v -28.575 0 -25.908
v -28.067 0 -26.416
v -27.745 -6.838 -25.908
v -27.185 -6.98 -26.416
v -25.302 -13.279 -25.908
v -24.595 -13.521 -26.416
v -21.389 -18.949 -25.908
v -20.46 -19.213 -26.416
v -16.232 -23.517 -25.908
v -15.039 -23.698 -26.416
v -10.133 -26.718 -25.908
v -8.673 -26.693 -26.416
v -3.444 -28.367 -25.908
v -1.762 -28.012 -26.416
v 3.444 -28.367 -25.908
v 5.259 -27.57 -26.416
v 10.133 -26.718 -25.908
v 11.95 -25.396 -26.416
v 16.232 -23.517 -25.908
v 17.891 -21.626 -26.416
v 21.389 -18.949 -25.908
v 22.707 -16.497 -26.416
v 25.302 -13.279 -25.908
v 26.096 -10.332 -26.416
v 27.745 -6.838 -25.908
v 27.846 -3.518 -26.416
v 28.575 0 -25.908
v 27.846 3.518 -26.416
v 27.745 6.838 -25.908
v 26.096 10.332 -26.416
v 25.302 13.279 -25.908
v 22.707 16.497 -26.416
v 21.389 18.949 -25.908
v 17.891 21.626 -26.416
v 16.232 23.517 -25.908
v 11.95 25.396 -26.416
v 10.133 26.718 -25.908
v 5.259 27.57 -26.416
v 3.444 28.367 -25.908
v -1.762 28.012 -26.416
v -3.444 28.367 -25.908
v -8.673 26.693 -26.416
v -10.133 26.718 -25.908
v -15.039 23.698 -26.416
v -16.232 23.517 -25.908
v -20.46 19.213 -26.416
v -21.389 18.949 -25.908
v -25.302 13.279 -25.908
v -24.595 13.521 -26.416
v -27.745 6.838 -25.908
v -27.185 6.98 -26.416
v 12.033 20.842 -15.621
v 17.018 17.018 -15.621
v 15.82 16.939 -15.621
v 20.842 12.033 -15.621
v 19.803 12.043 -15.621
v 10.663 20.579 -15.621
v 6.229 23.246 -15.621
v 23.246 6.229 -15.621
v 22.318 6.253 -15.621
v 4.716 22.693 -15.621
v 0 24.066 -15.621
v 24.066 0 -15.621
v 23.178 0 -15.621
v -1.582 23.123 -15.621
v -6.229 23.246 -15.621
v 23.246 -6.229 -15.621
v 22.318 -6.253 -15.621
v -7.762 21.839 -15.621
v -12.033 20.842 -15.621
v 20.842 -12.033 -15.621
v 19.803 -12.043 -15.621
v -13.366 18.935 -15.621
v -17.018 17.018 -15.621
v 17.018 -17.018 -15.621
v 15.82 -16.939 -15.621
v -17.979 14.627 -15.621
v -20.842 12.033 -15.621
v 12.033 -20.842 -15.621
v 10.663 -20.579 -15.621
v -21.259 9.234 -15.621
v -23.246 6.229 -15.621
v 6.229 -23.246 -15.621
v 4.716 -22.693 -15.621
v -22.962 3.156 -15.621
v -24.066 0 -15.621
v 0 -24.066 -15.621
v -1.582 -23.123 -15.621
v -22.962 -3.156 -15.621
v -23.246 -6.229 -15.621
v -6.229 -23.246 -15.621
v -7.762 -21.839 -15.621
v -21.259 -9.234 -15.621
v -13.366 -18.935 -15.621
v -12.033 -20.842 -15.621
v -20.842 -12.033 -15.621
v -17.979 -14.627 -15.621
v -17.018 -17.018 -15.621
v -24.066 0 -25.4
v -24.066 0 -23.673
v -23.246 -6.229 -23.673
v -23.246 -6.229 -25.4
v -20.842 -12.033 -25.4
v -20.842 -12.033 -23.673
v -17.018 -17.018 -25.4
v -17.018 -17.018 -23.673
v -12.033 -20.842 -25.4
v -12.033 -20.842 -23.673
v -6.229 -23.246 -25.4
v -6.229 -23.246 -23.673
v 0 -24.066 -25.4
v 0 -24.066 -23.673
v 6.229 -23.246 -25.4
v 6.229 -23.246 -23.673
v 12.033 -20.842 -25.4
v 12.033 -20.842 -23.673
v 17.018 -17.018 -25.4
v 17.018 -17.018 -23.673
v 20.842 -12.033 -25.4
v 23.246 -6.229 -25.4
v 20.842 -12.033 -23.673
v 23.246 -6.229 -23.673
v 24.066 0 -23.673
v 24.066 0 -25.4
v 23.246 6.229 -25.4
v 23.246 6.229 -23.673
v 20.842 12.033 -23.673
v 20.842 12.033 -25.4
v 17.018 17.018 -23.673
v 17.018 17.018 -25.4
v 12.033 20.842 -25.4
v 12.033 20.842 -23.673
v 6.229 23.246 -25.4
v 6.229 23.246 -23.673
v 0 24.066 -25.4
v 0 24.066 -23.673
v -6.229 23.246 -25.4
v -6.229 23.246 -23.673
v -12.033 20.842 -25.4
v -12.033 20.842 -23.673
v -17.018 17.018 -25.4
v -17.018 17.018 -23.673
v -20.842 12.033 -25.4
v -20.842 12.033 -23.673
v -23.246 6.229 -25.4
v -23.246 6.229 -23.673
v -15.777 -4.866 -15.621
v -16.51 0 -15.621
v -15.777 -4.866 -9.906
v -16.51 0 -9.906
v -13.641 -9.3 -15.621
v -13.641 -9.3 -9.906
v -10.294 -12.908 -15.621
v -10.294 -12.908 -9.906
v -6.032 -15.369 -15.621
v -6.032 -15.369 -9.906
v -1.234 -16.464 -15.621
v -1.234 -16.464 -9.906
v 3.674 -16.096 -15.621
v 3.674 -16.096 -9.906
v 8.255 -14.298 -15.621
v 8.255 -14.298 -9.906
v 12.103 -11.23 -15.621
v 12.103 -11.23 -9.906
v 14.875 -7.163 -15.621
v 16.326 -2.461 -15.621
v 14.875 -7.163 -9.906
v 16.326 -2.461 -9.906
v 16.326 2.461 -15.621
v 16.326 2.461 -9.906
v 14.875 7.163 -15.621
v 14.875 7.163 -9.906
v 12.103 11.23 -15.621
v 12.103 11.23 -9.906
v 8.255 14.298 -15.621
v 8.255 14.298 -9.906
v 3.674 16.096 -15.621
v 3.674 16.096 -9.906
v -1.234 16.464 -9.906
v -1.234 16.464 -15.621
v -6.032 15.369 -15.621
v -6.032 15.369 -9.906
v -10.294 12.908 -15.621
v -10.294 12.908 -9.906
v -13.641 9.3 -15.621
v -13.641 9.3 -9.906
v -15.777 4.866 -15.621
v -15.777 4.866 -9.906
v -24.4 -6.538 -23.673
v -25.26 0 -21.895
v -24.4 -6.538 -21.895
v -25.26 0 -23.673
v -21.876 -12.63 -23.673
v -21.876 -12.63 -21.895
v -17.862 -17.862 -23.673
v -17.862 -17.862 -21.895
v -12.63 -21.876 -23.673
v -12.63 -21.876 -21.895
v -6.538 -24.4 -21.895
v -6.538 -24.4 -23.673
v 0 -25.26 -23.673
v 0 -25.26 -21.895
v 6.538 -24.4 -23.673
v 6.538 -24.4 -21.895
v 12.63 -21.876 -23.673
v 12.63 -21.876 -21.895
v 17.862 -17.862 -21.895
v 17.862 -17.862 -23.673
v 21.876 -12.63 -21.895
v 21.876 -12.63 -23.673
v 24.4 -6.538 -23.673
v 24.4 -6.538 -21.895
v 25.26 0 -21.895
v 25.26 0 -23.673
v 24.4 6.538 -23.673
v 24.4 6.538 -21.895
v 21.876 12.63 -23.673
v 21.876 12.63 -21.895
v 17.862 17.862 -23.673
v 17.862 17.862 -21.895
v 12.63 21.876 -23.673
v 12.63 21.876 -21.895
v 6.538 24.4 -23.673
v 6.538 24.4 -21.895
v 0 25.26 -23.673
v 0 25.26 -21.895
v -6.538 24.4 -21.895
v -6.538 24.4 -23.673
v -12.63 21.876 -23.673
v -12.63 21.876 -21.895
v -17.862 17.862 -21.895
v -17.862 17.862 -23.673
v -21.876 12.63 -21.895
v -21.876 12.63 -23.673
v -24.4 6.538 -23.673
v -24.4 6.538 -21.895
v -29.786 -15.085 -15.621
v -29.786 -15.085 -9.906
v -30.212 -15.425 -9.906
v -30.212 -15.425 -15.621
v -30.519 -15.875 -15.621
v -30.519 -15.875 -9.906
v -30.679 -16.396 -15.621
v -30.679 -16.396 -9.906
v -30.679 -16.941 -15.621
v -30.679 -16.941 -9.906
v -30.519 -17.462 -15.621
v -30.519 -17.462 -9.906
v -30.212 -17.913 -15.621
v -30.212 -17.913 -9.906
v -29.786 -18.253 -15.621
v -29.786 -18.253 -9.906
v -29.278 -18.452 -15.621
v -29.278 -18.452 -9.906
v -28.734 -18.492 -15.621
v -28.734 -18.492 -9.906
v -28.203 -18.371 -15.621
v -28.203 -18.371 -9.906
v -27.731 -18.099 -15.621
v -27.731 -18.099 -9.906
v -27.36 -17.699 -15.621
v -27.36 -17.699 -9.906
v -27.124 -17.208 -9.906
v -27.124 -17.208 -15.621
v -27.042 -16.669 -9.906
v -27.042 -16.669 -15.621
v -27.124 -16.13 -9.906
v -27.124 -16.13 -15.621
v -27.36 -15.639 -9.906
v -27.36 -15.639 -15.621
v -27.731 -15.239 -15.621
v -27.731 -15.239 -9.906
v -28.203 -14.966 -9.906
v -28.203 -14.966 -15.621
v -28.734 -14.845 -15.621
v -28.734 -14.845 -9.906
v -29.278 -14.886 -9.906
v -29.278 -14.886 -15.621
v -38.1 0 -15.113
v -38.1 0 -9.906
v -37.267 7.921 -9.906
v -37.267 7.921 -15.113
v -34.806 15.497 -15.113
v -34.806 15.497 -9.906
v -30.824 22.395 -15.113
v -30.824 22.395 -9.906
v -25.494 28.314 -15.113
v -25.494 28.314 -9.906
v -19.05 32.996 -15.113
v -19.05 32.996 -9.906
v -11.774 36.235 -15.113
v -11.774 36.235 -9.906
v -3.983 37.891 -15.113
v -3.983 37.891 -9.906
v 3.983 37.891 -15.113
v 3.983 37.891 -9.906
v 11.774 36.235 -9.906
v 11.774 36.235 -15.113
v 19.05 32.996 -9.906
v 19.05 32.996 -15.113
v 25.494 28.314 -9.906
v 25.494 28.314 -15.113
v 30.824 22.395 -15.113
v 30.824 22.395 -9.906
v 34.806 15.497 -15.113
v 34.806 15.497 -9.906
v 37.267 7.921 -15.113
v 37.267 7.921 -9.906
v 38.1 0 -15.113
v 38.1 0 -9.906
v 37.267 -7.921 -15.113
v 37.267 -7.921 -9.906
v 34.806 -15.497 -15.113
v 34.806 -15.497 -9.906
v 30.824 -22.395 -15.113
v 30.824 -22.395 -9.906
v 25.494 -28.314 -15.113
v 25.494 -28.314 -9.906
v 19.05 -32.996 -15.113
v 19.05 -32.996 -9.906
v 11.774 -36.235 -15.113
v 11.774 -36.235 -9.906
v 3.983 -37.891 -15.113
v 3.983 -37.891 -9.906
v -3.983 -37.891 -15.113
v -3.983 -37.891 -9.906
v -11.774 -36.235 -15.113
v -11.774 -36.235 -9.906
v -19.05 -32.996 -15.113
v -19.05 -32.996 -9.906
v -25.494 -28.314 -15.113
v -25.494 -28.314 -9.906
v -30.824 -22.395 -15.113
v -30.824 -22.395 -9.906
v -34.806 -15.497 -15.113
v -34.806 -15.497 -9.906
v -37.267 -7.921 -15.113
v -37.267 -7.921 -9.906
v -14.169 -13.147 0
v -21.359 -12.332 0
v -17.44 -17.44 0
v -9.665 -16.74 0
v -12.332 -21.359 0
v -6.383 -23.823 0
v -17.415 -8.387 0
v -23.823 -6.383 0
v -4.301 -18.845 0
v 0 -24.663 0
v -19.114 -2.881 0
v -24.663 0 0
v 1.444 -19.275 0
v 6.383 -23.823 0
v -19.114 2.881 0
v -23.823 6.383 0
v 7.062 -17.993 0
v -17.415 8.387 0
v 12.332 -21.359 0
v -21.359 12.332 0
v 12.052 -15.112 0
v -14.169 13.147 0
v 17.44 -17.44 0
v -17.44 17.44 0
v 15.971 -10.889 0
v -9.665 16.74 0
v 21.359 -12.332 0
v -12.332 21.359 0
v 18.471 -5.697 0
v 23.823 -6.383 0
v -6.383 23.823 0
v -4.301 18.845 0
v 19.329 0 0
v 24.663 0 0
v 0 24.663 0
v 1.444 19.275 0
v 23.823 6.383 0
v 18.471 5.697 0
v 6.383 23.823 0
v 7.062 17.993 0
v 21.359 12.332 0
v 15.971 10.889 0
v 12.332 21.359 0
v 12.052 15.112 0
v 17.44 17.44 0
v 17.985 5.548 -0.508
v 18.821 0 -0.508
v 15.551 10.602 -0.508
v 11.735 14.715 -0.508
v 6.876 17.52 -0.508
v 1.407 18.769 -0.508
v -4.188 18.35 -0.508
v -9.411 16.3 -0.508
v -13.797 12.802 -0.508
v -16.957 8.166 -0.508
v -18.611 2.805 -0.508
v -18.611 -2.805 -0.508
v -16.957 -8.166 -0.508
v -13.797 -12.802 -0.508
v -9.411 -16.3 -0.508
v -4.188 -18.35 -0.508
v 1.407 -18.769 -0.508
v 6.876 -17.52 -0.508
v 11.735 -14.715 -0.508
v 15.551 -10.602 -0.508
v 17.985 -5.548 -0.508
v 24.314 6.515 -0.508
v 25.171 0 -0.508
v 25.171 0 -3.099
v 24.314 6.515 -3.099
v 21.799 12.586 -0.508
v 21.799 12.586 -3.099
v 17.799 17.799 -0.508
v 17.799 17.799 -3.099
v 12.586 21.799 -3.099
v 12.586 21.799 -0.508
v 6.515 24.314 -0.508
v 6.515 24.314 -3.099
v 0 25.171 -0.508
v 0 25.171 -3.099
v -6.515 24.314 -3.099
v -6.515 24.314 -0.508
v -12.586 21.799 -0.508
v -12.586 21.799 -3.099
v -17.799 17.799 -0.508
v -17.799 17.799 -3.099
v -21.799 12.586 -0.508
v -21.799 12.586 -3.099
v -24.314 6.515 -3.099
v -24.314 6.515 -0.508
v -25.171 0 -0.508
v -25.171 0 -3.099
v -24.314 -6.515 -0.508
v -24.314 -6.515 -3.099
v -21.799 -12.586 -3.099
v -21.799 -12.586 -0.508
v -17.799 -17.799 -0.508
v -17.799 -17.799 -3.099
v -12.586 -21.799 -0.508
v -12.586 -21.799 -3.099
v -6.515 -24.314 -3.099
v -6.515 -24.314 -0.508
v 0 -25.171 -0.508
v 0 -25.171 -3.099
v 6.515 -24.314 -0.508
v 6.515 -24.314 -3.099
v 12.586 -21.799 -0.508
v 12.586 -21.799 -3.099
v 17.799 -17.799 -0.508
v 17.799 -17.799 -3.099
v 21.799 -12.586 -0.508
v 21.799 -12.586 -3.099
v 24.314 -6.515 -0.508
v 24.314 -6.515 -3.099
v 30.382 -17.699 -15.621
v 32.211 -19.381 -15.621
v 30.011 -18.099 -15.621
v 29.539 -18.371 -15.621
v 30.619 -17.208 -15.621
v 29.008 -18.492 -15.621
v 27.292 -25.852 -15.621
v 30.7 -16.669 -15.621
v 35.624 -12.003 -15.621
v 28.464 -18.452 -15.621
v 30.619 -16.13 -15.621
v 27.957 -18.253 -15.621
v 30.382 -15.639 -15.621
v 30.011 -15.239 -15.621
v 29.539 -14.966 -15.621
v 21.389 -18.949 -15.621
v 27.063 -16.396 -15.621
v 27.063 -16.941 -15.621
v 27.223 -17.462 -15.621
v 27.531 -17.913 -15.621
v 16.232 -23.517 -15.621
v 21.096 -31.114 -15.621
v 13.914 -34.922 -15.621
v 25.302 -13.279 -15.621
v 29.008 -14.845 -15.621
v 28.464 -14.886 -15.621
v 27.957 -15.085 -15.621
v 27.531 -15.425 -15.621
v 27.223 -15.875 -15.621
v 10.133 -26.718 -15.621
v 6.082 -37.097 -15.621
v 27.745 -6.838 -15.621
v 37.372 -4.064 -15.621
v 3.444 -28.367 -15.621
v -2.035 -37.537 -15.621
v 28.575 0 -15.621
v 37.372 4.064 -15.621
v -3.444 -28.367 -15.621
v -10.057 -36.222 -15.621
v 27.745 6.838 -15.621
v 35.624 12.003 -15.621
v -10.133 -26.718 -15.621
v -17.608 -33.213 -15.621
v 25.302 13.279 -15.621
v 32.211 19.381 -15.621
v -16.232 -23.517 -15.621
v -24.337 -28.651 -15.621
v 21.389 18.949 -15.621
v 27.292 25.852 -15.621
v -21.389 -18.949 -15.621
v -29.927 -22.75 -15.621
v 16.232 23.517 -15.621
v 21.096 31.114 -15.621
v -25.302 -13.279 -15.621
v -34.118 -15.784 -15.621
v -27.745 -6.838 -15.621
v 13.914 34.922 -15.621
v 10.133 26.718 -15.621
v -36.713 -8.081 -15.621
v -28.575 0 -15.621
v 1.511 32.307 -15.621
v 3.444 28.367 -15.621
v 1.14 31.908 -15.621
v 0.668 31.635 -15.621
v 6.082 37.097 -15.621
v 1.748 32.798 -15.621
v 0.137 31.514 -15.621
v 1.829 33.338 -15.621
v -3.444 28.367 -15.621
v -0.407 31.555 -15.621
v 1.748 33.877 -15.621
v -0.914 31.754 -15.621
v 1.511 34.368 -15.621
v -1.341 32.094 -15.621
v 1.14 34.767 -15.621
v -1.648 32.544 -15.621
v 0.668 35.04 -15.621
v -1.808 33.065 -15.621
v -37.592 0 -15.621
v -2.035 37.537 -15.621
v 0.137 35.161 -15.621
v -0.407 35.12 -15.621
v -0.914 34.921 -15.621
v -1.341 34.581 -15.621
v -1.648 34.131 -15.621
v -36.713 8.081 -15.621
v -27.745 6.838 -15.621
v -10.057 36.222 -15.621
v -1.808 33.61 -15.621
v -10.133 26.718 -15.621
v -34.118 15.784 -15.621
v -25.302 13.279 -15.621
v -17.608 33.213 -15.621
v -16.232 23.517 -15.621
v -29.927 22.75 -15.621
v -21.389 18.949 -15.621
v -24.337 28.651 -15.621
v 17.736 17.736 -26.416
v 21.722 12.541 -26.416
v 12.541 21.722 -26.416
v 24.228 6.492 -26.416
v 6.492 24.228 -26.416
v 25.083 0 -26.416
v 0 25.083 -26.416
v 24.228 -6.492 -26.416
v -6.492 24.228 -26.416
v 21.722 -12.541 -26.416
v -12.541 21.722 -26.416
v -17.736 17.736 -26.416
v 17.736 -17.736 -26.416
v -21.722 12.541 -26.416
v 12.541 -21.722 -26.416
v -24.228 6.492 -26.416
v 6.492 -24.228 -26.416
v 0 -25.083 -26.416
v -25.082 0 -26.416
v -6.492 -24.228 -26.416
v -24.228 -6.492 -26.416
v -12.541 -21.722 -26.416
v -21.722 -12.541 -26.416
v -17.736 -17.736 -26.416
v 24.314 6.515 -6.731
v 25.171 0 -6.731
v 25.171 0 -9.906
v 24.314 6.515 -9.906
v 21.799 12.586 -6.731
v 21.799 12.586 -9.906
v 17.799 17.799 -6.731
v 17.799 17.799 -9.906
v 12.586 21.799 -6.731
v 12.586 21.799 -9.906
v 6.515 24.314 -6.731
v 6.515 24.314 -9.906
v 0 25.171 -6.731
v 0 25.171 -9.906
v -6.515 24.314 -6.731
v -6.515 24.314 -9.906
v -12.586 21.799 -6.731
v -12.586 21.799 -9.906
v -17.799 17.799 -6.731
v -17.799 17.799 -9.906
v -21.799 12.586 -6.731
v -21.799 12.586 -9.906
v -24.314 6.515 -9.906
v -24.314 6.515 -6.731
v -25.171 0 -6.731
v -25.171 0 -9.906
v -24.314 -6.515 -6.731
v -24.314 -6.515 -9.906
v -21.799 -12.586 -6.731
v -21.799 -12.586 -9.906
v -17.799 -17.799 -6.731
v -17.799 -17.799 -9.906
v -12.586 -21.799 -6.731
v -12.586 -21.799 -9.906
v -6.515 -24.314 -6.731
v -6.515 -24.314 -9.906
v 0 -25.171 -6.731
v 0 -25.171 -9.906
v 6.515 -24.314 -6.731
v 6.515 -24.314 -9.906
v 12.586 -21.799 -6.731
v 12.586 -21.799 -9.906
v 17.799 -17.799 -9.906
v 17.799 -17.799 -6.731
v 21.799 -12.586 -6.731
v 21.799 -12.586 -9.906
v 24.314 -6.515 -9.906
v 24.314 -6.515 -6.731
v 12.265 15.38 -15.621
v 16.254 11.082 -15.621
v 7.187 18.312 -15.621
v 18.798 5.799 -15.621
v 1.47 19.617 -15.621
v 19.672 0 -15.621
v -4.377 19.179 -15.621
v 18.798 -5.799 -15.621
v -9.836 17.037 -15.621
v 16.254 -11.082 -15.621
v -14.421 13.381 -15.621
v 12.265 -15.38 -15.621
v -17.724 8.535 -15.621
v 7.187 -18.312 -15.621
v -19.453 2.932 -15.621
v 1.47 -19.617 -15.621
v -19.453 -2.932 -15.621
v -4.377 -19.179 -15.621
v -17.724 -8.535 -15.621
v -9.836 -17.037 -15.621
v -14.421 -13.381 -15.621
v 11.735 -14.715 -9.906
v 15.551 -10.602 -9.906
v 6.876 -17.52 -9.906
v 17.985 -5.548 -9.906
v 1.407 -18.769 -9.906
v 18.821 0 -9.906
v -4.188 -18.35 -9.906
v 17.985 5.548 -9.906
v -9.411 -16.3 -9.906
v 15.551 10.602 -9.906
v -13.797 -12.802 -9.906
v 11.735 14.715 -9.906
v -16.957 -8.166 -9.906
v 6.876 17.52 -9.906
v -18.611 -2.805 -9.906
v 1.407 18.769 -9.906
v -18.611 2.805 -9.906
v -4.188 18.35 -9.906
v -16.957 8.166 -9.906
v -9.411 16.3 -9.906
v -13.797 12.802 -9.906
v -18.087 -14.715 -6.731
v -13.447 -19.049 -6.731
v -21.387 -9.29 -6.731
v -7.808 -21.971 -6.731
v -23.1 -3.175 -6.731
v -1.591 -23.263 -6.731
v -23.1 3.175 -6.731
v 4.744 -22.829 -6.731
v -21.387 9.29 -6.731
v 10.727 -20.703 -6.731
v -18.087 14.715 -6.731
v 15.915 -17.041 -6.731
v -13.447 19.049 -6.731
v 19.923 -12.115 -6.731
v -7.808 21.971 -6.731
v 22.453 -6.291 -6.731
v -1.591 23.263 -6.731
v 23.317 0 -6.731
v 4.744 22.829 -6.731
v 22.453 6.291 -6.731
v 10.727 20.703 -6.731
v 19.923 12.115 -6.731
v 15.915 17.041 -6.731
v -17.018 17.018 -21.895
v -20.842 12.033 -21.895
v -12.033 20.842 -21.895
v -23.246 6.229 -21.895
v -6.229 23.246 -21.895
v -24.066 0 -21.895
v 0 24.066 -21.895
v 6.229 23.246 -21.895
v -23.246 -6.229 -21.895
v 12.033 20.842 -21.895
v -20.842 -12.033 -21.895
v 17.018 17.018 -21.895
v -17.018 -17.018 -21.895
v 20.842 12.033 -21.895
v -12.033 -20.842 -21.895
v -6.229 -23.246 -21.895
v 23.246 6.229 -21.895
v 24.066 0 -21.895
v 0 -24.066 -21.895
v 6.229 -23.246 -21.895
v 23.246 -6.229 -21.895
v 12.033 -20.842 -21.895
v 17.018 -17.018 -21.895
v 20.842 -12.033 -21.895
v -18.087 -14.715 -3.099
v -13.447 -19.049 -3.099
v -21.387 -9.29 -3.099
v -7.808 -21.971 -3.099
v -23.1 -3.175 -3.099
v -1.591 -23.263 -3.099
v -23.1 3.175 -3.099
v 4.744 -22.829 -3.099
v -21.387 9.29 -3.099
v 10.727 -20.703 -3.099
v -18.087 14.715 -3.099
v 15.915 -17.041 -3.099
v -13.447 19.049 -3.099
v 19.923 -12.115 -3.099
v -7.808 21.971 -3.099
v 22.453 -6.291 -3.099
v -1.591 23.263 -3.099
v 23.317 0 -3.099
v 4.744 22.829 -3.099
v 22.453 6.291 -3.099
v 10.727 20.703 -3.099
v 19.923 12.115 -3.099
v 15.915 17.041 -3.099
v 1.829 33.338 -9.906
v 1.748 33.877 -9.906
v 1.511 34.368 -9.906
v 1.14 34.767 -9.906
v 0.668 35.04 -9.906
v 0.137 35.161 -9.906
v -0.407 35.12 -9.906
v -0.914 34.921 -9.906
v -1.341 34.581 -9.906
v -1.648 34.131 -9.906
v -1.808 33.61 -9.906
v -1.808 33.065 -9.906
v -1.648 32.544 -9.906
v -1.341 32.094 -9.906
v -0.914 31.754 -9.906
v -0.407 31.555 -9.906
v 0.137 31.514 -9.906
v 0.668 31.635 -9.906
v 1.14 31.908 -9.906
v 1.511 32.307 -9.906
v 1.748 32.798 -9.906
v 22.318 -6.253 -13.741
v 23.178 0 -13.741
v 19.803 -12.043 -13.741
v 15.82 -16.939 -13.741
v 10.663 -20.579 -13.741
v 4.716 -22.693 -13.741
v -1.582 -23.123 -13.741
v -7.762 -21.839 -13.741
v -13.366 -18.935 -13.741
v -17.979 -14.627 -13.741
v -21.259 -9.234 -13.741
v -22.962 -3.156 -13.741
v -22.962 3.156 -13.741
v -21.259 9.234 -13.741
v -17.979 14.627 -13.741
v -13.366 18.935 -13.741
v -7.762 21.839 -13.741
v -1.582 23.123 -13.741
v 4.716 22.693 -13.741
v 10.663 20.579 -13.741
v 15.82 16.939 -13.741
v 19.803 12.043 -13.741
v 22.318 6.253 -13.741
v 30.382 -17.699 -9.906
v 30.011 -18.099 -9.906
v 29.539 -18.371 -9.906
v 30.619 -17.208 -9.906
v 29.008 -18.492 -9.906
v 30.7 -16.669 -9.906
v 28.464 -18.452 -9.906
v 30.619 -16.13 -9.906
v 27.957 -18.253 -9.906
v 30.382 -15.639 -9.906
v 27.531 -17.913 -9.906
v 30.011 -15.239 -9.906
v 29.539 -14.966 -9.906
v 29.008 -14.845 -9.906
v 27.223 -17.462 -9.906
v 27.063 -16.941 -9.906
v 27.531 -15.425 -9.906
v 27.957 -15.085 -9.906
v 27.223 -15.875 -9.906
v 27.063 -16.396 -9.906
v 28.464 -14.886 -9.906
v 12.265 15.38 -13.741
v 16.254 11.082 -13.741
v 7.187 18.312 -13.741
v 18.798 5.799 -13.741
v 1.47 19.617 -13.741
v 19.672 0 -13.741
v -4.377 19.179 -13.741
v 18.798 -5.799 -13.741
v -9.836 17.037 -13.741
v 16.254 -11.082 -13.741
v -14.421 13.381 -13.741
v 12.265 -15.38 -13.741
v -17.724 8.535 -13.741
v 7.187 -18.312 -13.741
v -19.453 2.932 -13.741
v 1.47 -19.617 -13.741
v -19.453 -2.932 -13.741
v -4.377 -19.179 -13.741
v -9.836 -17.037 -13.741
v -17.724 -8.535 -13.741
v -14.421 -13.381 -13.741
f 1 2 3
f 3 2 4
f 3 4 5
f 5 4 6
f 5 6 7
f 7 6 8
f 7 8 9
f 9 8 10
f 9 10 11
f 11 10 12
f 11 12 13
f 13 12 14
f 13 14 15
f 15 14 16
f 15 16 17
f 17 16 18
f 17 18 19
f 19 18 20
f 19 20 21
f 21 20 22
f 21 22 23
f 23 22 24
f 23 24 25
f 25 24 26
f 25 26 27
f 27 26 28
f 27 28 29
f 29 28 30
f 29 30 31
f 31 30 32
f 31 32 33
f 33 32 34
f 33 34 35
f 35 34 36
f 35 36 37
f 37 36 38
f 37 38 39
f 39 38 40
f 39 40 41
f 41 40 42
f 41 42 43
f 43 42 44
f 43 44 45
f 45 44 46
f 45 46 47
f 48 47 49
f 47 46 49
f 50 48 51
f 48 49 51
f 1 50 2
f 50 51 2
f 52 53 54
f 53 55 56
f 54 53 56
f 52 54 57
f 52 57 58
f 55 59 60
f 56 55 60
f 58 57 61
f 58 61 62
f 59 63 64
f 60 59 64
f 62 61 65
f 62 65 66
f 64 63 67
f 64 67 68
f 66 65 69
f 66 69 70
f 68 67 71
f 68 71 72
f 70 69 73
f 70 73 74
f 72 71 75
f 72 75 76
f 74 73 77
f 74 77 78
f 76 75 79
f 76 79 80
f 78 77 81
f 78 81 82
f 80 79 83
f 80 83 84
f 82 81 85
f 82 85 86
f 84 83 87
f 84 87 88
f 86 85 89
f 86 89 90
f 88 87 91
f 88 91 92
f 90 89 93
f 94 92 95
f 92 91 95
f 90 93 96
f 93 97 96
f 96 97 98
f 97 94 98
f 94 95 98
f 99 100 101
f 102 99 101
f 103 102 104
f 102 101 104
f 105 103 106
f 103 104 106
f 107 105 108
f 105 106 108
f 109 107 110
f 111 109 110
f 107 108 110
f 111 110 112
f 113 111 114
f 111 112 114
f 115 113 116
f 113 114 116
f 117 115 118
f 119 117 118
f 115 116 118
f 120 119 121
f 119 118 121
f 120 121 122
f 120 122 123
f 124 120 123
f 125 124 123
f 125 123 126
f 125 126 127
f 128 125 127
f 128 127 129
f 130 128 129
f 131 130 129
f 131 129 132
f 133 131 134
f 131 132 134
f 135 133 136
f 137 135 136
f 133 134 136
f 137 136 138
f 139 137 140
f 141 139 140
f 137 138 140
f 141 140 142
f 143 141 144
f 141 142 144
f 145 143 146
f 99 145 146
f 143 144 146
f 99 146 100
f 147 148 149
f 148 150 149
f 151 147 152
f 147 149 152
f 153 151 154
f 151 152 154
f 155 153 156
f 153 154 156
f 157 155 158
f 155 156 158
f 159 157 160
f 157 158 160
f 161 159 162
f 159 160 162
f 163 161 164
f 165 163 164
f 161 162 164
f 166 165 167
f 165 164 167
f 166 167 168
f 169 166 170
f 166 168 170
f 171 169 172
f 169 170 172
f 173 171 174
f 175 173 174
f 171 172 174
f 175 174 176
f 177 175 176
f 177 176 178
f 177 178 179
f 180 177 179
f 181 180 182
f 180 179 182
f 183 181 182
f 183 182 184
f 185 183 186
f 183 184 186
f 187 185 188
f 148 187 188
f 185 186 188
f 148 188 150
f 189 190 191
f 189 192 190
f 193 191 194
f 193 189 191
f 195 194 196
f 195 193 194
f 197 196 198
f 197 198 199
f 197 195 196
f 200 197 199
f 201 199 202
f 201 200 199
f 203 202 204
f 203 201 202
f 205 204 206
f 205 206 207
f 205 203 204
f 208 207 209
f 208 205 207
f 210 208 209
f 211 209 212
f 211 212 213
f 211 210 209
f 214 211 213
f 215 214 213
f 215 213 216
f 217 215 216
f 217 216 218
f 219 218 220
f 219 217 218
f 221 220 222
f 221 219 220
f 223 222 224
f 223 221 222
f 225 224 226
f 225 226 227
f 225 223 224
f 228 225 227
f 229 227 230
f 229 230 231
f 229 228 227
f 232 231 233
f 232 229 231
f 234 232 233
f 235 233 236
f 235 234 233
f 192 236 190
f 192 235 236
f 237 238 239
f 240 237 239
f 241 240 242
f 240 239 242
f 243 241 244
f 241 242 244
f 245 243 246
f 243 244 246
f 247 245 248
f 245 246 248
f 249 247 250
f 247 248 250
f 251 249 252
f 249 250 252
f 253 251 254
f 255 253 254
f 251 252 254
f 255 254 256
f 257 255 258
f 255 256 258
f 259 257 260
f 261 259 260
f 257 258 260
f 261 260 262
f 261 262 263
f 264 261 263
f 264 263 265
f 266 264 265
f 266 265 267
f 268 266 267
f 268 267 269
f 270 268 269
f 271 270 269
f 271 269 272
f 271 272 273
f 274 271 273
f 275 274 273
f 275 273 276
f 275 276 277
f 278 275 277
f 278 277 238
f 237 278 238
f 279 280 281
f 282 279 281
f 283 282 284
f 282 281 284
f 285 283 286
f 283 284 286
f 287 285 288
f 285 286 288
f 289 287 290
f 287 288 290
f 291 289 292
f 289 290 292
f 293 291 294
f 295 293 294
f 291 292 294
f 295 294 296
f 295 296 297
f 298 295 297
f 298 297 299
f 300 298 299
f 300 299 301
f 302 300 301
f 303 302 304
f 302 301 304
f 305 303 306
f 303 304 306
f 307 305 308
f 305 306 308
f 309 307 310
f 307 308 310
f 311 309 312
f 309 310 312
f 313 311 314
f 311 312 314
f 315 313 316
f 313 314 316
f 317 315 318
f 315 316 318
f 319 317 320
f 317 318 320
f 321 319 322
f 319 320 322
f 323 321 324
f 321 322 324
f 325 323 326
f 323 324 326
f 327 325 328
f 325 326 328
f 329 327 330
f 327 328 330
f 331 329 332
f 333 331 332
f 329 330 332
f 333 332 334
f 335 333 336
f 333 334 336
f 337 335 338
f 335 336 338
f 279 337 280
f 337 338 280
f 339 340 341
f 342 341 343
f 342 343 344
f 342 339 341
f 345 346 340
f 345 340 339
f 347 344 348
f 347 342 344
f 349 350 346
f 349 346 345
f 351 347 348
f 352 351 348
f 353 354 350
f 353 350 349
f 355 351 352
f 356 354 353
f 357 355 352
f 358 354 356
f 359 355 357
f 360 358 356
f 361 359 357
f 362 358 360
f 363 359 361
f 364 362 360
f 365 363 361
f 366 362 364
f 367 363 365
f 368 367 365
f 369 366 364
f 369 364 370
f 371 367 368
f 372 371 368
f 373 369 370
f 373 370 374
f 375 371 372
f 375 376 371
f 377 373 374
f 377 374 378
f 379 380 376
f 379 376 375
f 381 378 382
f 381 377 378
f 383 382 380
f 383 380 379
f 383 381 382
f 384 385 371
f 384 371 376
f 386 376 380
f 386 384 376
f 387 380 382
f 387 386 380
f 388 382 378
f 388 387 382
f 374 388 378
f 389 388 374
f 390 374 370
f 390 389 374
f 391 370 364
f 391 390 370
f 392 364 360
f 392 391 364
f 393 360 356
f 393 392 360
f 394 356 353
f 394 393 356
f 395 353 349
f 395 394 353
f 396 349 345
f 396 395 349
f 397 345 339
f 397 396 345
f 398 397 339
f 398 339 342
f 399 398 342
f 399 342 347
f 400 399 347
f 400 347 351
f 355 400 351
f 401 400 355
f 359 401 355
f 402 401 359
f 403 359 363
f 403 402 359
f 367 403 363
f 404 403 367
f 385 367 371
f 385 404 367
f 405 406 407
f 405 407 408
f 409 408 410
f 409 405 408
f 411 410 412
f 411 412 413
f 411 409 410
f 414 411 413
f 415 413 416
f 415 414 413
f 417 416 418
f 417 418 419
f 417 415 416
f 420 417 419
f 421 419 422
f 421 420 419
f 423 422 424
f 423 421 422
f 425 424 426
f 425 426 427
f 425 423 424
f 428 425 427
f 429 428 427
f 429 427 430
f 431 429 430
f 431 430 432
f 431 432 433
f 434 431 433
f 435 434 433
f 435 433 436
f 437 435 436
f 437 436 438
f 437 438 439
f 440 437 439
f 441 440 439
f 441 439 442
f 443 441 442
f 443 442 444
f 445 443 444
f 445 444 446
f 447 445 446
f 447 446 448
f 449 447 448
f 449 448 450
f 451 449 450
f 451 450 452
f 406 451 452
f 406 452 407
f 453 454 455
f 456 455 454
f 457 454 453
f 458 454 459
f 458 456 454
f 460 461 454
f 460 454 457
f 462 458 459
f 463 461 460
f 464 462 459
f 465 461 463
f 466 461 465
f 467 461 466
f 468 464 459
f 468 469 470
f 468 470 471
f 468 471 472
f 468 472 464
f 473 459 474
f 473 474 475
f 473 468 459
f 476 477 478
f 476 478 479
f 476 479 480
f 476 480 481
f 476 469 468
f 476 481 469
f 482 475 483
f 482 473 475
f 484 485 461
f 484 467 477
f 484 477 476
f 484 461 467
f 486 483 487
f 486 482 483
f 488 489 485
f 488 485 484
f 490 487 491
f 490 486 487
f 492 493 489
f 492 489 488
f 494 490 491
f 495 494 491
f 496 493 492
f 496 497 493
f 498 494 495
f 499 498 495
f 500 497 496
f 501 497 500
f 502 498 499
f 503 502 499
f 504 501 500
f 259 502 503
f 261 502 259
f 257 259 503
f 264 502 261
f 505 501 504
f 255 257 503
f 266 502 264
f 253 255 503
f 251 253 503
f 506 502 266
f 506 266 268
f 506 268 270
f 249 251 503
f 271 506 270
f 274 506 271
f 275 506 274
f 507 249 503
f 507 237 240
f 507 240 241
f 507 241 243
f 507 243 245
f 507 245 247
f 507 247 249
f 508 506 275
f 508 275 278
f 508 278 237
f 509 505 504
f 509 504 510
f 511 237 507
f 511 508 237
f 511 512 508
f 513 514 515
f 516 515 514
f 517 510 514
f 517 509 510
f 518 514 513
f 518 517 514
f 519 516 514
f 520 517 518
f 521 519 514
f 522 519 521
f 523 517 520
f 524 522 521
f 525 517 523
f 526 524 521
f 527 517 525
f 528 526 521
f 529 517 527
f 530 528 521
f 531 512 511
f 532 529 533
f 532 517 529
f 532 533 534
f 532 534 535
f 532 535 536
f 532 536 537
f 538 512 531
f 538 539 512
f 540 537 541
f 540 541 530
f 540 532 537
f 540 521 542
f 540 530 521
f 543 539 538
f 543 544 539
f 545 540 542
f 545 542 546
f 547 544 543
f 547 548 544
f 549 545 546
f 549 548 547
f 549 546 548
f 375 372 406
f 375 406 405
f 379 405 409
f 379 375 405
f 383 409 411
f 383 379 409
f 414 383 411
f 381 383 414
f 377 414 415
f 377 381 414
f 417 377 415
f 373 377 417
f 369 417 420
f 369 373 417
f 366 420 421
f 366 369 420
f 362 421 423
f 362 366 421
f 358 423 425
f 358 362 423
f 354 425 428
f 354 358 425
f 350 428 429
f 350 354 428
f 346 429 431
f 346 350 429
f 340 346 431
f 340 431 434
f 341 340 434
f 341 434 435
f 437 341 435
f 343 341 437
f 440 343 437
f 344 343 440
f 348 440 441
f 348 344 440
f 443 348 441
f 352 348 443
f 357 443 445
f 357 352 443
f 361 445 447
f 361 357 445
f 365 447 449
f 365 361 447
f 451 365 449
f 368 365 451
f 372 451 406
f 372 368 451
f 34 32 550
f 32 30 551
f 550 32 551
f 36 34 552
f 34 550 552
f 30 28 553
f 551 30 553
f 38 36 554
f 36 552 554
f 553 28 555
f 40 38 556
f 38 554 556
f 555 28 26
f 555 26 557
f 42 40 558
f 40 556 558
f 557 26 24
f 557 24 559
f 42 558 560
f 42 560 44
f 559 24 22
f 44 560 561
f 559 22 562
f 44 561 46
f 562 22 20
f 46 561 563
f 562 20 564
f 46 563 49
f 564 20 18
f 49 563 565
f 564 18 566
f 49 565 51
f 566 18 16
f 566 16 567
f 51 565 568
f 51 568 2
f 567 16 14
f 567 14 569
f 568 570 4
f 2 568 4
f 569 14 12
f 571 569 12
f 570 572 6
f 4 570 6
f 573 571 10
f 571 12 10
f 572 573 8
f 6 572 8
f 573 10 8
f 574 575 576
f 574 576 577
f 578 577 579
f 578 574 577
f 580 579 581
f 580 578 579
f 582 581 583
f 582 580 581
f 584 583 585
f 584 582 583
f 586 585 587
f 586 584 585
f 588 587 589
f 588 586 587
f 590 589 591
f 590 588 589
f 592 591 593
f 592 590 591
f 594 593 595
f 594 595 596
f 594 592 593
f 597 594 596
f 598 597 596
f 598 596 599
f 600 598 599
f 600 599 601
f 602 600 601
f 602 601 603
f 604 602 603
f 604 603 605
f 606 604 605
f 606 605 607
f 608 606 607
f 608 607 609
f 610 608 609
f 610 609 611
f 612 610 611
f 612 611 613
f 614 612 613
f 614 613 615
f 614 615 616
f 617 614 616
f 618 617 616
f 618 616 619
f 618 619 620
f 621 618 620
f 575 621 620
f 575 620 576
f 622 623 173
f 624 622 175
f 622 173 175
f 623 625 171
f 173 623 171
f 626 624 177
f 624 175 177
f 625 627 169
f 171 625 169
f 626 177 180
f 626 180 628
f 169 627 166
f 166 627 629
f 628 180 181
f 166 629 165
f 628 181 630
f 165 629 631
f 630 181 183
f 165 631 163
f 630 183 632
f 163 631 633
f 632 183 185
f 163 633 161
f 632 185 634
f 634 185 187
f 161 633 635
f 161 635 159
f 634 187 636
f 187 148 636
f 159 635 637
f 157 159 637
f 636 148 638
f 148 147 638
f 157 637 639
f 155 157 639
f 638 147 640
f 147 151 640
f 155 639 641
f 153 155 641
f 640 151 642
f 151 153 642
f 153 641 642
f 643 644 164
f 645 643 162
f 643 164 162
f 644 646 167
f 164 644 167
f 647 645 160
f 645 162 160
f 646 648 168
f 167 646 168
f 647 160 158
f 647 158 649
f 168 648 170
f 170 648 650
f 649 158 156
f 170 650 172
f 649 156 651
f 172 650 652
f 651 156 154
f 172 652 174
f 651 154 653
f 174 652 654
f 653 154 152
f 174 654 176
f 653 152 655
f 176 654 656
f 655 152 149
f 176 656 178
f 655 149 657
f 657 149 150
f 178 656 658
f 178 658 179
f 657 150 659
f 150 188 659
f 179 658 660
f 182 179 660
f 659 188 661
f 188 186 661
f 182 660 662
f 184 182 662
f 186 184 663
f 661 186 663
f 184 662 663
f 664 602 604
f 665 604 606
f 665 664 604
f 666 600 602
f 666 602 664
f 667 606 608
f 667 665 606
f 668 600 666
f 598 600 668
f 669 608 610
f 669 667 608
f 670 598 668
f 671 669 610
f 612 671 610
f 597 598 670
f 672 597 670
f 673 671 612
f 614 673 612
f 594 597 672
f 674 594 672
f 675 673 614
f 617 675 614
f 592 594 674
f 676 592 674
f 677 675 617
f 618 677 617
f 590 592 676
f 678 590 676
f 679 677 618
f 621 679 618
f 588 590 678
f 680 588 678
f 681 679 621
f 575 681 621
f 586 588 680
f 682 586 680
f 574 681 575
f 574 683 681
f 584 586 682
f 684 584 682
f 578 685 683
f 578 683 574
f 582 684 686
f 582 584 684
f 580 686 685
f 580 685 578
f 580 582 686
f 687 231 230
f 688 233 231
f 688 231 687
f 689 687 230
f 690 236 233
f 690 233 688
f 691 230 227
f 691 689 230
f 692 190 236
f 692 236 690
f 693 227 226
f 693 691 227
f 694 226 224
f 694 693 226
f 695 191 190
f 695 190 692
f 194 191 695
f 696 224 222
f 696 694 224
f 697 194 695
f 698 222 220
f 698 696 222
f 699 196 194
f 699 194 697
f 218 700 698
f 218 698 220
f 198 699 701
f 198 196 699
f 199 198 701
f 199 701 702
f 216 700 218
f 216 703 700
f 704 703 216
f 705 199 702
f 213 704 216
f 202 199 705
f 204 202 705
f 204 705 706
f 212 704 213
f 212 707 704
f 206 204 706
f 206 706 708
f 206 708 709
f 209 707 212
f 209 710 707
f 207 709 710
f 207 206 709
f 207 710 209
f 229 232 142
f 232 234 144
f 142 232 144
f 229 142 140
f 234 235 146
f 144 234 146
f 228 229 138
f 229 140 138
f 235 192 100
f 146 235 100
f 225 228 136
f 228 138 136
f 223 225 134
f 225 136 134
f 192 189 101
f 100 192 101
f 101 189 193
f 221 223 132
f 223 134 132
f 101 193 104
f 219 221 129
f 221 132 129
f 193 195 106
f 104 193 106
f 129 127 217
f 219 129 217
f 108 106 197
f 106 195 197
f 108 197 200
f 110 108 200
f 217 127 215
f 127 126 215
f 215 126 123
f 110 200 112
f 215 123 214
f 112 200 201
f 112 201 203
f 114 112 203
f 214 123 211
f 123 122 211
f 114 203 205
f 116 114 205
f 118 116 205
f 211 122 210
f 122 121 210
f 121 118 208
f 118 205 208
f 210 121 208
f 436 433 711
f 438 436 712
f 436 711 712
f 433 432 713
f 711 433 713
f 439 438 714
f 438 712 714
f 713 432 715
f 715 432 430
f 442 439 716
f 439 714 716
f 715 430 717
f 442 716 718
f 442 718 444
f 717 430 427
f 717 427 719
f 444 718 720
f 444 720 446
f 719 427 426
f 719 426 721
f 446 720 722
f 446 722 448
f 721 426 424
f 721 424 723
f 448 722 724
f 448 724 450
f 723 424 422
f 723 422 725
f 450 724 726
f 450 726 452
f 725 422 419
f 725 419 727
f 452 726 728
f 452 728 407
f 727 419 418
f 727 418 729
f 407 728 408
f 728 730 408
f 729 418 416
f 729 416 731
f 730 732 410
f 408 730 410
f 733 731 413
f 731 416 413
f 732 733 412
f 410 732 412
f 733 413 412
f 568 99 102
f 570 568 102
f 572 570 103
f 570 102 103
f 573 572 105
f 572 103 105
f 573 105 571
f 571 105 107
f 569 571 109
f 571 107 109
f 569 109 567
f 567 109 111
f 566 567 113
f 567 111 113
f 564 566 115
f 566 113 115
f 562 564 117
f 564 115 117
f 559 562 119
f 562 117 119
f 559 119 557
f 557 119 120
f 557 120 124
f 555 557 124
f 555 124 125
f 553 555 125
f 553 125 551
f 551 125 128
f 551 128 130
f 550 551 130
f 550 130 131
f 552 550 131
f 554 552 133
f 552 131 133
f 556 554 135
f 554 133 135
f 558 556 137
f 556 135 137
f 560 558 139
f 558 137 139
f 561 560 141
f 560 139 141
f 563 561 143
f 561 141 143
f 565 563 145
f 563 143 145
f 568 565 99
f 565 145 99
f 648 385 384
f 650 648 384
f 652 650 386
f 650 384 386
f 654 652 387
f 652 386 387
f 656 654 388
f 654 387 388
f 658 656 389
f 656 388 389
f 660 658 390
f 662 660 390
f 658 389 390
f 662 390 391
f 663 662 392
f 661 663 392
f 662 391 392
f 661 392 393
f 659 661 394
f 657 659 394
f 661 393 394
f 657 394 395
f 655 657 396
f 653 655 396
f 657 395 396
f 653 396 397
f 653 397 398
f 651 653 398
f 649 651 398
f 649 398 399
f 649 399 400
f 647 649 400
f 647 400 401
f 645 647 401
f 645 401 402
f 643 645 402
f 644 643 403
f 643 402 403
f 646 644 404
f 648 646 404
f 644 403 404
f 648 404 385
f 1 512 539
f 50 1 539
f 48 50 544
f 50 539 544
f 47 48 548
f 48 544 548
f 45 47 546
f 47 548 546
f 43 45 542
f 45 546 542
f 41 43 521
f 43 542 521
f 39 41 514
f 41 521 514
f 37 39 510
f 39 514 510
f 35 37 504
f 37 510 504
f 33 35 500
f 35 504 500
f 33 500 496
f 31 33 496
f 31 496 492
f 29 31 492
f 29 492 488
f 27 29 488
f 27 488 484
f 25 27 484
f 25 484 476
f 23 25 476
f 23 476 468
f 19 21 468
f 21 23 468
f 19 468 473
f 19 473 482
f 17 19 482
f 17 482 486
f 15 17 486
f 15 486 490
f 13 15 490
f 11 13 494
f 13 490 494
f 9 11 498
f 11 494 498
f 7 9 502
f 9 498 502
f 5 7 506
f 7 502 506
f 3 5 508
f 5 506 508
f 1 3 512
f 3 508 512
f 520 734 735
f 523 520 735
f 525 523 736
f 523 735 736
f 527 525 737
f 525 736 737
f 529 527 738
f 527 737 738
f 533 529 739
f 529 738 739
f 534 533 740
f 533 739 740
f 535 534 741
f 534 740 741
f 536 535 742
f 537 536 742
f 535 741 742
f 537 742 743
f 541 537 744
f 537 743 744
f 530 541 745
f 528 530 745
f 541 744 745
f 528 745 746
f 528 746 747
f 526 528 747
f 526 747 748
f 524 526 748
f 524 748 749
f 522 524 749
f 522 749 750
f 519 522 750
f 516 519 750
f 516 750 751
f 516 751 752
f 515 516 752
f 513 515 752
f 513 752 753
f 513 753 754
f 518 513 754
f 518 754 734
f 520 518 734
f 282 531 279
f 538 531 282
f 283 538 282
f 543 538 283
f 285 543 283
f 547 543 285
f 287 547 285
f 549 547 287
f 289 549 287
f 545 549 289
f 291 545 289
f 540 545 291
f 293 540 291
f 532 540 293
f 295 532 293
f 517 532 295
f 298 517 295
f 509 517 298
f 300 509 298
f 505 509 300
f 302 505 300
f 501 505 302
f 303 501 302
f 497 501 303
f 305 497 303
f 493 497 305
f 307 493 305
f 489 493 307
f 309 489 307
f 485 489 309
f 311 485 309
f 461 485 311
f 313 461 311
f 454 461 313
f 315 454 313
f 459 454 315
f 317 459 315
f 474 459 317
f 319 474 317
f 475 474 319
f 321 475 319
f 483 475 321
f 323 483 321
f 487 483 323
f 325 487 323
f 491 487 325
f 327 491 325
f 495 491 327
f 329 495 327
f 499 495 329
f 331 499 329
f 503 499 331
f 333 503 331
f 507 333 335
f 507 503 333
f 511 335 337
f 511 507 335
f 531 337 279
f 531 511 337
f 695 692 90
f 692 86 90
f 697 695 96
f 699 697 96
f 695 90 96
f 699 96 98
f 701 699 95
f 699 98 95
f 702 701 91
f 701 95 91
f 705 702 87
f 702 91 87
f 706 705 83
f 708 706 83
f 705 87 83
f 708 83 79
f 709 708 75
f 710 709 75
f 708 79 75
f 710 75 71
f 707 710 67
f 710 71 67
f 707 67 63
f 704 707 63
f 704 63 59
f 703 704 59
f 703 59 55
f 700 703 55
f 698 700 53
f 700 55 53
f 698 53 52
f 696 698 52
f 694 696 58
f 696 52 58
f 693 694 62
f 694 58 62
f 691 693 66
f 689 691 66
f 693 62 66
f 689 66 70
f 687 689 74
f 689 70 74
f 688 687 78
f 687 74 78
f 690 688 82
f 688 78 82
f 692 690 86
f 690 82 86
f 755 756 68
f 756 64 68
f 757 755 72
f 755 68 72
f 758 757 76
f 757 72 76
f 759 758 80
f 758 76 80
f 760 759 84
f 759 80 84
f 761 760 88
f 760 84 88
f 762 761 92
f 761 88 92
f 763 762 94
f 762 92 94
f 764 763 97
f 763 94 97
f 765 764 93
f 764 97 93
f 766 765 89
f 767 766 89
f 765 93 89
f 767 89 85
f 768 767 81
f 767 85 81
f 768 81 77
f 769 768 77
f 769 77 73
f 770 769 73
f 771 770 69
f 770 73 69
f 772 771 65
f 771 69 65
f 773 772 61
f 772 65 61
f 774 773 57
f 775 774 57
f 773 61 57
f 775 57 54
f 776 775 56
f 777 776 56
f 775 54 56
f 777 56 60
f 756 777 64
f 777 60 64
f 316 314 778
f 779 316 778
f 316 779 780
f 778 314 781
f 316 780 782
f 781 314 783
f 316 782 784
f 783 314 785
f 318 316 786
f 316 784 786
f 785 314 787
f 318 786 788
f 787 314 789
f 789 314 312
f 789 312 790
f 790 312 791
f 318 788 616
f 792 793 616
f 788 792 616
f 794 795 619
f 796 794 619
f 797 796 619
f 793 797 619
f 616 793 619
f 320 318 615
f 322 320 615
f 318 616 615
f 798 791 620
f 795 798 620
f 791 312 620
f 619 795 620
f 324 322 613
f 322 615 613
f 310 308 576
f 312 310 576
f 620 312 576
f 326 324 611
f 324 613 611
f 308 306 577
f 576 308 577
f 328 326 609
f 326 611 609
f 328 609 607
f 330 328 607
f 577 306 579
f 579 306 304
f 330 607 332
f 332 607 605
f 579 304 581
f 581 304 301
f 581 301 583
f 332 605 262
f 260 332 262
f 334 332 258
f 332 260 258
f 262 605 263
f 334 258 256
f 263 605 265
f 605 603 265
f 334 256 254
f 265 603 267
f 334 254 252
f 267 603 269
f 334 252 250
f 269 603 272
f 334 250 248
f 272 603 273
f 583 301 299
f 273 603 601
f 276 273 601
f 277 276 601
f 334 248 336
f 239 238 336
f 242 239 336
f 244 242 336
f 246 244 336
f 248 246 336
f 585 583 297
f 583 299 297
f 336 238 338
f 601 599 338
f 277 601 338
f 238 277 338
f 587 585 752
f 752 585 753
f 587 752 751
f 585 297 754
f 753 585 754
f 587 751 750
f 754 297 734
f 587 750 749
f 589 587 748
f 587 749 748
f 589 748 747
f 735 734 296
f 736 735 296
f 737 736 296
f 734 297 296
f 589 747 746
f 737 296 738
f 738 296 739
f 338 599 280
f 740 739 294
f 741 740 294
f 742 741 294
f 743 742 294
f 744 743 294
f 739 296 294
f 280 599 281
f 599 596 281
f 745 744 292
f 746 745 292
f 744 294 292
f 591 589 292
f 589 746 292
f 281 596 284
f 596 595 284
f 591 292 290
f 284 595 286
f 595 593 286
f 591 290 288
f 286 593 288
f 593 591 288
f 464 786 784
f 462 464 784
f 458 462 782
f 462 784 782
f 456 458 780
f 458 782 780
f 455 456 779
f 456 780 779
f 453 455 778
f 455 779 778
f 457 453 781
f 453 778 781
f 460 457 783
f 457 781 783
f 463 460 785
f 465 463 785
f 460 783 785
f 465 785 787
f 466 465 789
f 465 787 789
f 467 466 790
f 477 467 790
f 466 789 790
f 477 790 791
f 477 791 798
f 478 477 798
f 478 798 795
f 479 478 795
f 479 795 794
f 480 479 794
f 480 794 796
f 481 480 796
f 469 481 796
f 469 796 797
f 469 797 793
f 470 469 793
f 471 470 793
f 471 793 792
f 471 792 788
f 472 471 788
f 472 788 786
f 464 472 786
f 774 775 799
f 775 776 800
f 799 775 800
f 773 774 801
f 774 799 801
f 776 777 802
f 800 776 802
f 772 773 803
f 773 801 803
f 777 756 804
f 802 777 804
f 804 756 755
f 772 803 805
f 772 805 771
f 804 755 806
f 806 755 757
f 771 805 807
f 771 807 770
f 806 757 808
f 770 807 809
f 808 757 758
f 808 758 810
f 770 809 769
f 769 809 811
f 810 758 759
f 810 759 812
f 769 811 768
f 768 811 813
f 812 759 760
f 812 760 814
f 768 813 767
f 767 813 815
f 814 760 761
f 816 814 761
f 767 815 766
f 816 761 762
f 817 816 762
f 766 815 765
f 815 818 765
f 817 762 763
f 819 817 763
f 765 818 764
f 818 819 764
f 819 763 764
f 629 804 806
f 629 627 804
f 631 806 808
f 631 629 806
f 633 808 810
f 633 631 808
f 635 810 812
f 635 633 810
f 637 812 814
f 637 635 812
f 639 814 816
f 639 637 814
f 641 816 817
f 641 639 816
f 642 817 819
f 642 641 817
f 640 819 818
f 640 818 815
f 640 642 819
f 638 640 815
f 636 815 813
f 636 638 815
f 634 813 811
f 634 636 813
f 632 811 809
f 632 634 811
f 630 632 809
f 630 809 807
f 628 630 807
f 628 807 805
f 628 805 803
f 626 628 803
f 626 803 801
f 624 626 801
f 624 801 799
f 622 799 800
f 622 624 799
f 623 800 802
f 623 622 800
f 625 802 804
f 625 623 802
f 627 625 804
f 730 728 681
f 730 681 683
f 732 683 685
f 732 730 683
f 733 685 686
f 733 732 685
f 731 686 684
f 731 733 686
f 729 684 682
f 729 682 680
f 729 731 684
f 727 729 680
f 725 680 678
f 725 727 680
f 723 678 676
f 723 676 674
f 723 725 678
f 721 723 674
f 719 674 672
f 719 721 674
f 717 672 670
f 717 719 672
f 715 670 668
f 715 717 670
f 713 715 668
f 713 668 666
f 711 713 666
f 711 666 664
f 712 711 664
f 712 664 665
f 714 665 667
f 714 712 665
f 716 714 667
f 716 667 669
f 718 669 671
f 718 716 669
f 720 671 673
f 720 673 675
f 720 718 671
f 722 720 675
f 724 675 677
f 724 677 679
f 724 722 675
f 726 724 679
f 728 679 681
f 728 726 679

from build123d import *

# Parameters (mm, degrees)
SKETCH1_R             = 25.1714
SKETCH1_R_2           = 18.8214
BOSS_EXTRUDE1_DEPTH   = 9.906
SKETCH2_R             = 28.575
BOSS_EXTRUDE2_DEPTH   = 5.08
CUT_EXTRUDE1_START    = 3.6322
SKETCH3_R             = 25.1714
SKETCH3_R_2           = 23.3172
CUT_EXTRUDE1_DEPTH    = 3.6322
SKETCH5_W             = 1.778
SKETCH5_H             = 12.5603
SKETCH6_R             = 16.51
CUT_EXTRUDE2_DEPTH    = 44.100364801
SKETCH10_W            = 1.8796
SKETCH10_H            = 3.5052
BOSS_EXTRUDE3_START   = -5.715
SKETCH7_R             = 38.1
SKETCH7_R_2           = 28.575
BOSS_EXTRUDE3_DEPTH   = 5.715
F_6_CLEARANCE_HOLE1_D = 3.6576
CIRPATTERN1_COUNT     = 3
CHAMFER1_SIZE         = 0.508
CHAMFER3_SIZE         = 1.016


with BuildPart() as part:
    # Sketch1 → Boss-Extrude1 (new body)
    with BuildSketch(Plane.XY):
        Circle(SKETCH1_R)
        Circle(SKETCH1_R_2, mode=Mode.SUBTRACT)
    extrude(amount=-BOSS_EXTRUDE1_DEPTH)

    # Sketch2 → Boss-Extrude2 (add)
    with BuildSketch(Plane(origin=(0, 0, -9.906), x_dir=(-1, 0, 0), z_dir=(0, 0, -1))):
        Circle(SKETCH2_R)
    extrude(amount=BOSS_EXTRUDE2_DEPTH)

    # Sketch3 → Cut-Extrude1 (cut)
    with BuildSketch(Plane.XY.offset(-6.731).offset(CUT_EXTRUDE1_START)):
        Circle(SKETCH3_R)
        Circle(SKETCH3_R_2, mode=Mode.SUBTRACT)
    extrude(amount=-CUT_EXTRUDE1_DEPTH, mode=Mode.SUBTRACT)

    # Sketch4 → Revolve1 (revolve)
    with BuildSketch(Plane(origin=(0, 0, 0), x_dir=(0, 0, -1), z_dir=(1, 0, 0)), mode=Mode.PRIVATE) as revolve1_sk:
        Polygon((9.906, 16.51), (9.906, 28.575), (26.416, 28.575), (26.416, 24.0665), (15.621, 24.0665), (15.621, 16.51), align=None)
    revolve(revolve1_sk.sketch.rotate(Axis((0, 0, -23.632862863), (0, 0, 1)), 90), axis=Axis((0, 0, -23.632862863), (0, 0, 1)))

    # Sketch5 → Cut-Revolve1 (revolve, cut)
    with BuildSketch(Plane(origin=(0, 0, 0), x_dir=(0, 0, -1), z_dir=(1, 0, 0)), mode=Mode.PRIVATE) as cut_revolve1_sk:
        with Locations((22.7838, 18.98015)):
            Rectangle(SKETCH5_W, SKETCH5_H)
    revolve(cut_revolve1_sk.sketch.rotate(Axis((0, 0, -23.632862863), (0, 0, 1)), 90), axis=Axis((0, 0, -23.632862863), (0, 0, 1)), mode=Mode.SUBTRACT)

    # Sketch6 → Cut-Extrude2 (cut, through all)
    with BuildSketch(Plane(origin=(0, 0, -14.986), x_dir=(-1, 0, 0), z_dir=(0, 0, -1))):
        Circle(SKETCH6_R)
    extrude(amount=-CUT_EXTRUDE2_DEPTH, mode=Mode.SUBTRACT)

    # Sketch10 → Cut-Revolve2 (revolve, cut)
    with BuildSketch(Plane(origin=(0, 0, 0), x_dir=(0, 0, -1), z_dir=(1, 0, 0)), mode=Mode.PRIVATE) as cut_revolve2_sk:
        with Locations((14.6812, 21.4249)):
            Rectangle(SKETCH10_W, SKETCH10_H)
    revolve(cut_revolve2_sk.sketch.rotate(Axis((0, 0, 0), (0, 0, -1)), 90), axis=Axis((0, 0, 0), (0, 0, -1)), mode=Mode.SUBTRACT)

    # Sketch7 → Boss-Extrude3 (add)
    with BuildSketch(Plane(origin=(0, 0, -15.621), x_dir=(-1, 0, 0), z_dir=(0, 0, -1)).offset(BOSS_EXTRUDE3_START)):
        Circle(SKETCH7_R)
        Circle(SKETCH7_R_2, mode=Mode.SUBTRACT)
    extrude(amount=BOSS_EXTRUDE3_DEPTH)

    # #6 Clearance Hole1 (through all)
    with Locations(Plane(origin=(12.683965444, 15.420187154, -15.621), x_dir=(-1, 0, 0), z_dir=(0, 0, -1))):
        with Locations((12.683965444, 17.917312846)):
            f_6_clearance_hole1 = Hole(F_6_CLEARANCE_HOLE1_D / 2)

    # CirPattern1: #6 Clearance Hole1 ×3 about axis
    cirpattern1_axis = Axis((0, 0, 0), (0, 0, 1))
    for i in range(1, CIRPATTERN1_COUNT):
        add(f_6_clearance_hole1.rotate(cirpattern1_axis, i * 360 / CIRPATTERN1_COUNT), mode=Mode.SUBTRACT)

    # Chamfer1
    chamfer1_edges = [part.edges().sort_by_distance(p)[0] for p in [
        (-25.1714, 0, 0),
        (28.575, 0, -26.416),
        (38.1, 0, -15.621),
        (-18.8214, 0, 0),
    ]]
    chamfer(chamfer1_edges, length=CHAMFER1_SIZE)

    # Chamfer3
    chamfer3_edges = [part.edges().sort_by_distance(p)[0] for p in [
        (24.0665, 0, -26.416),
    ]]
    chamfer(chamfer3_edges, length=CHAMFER3_SIZE)


solid = part.part
